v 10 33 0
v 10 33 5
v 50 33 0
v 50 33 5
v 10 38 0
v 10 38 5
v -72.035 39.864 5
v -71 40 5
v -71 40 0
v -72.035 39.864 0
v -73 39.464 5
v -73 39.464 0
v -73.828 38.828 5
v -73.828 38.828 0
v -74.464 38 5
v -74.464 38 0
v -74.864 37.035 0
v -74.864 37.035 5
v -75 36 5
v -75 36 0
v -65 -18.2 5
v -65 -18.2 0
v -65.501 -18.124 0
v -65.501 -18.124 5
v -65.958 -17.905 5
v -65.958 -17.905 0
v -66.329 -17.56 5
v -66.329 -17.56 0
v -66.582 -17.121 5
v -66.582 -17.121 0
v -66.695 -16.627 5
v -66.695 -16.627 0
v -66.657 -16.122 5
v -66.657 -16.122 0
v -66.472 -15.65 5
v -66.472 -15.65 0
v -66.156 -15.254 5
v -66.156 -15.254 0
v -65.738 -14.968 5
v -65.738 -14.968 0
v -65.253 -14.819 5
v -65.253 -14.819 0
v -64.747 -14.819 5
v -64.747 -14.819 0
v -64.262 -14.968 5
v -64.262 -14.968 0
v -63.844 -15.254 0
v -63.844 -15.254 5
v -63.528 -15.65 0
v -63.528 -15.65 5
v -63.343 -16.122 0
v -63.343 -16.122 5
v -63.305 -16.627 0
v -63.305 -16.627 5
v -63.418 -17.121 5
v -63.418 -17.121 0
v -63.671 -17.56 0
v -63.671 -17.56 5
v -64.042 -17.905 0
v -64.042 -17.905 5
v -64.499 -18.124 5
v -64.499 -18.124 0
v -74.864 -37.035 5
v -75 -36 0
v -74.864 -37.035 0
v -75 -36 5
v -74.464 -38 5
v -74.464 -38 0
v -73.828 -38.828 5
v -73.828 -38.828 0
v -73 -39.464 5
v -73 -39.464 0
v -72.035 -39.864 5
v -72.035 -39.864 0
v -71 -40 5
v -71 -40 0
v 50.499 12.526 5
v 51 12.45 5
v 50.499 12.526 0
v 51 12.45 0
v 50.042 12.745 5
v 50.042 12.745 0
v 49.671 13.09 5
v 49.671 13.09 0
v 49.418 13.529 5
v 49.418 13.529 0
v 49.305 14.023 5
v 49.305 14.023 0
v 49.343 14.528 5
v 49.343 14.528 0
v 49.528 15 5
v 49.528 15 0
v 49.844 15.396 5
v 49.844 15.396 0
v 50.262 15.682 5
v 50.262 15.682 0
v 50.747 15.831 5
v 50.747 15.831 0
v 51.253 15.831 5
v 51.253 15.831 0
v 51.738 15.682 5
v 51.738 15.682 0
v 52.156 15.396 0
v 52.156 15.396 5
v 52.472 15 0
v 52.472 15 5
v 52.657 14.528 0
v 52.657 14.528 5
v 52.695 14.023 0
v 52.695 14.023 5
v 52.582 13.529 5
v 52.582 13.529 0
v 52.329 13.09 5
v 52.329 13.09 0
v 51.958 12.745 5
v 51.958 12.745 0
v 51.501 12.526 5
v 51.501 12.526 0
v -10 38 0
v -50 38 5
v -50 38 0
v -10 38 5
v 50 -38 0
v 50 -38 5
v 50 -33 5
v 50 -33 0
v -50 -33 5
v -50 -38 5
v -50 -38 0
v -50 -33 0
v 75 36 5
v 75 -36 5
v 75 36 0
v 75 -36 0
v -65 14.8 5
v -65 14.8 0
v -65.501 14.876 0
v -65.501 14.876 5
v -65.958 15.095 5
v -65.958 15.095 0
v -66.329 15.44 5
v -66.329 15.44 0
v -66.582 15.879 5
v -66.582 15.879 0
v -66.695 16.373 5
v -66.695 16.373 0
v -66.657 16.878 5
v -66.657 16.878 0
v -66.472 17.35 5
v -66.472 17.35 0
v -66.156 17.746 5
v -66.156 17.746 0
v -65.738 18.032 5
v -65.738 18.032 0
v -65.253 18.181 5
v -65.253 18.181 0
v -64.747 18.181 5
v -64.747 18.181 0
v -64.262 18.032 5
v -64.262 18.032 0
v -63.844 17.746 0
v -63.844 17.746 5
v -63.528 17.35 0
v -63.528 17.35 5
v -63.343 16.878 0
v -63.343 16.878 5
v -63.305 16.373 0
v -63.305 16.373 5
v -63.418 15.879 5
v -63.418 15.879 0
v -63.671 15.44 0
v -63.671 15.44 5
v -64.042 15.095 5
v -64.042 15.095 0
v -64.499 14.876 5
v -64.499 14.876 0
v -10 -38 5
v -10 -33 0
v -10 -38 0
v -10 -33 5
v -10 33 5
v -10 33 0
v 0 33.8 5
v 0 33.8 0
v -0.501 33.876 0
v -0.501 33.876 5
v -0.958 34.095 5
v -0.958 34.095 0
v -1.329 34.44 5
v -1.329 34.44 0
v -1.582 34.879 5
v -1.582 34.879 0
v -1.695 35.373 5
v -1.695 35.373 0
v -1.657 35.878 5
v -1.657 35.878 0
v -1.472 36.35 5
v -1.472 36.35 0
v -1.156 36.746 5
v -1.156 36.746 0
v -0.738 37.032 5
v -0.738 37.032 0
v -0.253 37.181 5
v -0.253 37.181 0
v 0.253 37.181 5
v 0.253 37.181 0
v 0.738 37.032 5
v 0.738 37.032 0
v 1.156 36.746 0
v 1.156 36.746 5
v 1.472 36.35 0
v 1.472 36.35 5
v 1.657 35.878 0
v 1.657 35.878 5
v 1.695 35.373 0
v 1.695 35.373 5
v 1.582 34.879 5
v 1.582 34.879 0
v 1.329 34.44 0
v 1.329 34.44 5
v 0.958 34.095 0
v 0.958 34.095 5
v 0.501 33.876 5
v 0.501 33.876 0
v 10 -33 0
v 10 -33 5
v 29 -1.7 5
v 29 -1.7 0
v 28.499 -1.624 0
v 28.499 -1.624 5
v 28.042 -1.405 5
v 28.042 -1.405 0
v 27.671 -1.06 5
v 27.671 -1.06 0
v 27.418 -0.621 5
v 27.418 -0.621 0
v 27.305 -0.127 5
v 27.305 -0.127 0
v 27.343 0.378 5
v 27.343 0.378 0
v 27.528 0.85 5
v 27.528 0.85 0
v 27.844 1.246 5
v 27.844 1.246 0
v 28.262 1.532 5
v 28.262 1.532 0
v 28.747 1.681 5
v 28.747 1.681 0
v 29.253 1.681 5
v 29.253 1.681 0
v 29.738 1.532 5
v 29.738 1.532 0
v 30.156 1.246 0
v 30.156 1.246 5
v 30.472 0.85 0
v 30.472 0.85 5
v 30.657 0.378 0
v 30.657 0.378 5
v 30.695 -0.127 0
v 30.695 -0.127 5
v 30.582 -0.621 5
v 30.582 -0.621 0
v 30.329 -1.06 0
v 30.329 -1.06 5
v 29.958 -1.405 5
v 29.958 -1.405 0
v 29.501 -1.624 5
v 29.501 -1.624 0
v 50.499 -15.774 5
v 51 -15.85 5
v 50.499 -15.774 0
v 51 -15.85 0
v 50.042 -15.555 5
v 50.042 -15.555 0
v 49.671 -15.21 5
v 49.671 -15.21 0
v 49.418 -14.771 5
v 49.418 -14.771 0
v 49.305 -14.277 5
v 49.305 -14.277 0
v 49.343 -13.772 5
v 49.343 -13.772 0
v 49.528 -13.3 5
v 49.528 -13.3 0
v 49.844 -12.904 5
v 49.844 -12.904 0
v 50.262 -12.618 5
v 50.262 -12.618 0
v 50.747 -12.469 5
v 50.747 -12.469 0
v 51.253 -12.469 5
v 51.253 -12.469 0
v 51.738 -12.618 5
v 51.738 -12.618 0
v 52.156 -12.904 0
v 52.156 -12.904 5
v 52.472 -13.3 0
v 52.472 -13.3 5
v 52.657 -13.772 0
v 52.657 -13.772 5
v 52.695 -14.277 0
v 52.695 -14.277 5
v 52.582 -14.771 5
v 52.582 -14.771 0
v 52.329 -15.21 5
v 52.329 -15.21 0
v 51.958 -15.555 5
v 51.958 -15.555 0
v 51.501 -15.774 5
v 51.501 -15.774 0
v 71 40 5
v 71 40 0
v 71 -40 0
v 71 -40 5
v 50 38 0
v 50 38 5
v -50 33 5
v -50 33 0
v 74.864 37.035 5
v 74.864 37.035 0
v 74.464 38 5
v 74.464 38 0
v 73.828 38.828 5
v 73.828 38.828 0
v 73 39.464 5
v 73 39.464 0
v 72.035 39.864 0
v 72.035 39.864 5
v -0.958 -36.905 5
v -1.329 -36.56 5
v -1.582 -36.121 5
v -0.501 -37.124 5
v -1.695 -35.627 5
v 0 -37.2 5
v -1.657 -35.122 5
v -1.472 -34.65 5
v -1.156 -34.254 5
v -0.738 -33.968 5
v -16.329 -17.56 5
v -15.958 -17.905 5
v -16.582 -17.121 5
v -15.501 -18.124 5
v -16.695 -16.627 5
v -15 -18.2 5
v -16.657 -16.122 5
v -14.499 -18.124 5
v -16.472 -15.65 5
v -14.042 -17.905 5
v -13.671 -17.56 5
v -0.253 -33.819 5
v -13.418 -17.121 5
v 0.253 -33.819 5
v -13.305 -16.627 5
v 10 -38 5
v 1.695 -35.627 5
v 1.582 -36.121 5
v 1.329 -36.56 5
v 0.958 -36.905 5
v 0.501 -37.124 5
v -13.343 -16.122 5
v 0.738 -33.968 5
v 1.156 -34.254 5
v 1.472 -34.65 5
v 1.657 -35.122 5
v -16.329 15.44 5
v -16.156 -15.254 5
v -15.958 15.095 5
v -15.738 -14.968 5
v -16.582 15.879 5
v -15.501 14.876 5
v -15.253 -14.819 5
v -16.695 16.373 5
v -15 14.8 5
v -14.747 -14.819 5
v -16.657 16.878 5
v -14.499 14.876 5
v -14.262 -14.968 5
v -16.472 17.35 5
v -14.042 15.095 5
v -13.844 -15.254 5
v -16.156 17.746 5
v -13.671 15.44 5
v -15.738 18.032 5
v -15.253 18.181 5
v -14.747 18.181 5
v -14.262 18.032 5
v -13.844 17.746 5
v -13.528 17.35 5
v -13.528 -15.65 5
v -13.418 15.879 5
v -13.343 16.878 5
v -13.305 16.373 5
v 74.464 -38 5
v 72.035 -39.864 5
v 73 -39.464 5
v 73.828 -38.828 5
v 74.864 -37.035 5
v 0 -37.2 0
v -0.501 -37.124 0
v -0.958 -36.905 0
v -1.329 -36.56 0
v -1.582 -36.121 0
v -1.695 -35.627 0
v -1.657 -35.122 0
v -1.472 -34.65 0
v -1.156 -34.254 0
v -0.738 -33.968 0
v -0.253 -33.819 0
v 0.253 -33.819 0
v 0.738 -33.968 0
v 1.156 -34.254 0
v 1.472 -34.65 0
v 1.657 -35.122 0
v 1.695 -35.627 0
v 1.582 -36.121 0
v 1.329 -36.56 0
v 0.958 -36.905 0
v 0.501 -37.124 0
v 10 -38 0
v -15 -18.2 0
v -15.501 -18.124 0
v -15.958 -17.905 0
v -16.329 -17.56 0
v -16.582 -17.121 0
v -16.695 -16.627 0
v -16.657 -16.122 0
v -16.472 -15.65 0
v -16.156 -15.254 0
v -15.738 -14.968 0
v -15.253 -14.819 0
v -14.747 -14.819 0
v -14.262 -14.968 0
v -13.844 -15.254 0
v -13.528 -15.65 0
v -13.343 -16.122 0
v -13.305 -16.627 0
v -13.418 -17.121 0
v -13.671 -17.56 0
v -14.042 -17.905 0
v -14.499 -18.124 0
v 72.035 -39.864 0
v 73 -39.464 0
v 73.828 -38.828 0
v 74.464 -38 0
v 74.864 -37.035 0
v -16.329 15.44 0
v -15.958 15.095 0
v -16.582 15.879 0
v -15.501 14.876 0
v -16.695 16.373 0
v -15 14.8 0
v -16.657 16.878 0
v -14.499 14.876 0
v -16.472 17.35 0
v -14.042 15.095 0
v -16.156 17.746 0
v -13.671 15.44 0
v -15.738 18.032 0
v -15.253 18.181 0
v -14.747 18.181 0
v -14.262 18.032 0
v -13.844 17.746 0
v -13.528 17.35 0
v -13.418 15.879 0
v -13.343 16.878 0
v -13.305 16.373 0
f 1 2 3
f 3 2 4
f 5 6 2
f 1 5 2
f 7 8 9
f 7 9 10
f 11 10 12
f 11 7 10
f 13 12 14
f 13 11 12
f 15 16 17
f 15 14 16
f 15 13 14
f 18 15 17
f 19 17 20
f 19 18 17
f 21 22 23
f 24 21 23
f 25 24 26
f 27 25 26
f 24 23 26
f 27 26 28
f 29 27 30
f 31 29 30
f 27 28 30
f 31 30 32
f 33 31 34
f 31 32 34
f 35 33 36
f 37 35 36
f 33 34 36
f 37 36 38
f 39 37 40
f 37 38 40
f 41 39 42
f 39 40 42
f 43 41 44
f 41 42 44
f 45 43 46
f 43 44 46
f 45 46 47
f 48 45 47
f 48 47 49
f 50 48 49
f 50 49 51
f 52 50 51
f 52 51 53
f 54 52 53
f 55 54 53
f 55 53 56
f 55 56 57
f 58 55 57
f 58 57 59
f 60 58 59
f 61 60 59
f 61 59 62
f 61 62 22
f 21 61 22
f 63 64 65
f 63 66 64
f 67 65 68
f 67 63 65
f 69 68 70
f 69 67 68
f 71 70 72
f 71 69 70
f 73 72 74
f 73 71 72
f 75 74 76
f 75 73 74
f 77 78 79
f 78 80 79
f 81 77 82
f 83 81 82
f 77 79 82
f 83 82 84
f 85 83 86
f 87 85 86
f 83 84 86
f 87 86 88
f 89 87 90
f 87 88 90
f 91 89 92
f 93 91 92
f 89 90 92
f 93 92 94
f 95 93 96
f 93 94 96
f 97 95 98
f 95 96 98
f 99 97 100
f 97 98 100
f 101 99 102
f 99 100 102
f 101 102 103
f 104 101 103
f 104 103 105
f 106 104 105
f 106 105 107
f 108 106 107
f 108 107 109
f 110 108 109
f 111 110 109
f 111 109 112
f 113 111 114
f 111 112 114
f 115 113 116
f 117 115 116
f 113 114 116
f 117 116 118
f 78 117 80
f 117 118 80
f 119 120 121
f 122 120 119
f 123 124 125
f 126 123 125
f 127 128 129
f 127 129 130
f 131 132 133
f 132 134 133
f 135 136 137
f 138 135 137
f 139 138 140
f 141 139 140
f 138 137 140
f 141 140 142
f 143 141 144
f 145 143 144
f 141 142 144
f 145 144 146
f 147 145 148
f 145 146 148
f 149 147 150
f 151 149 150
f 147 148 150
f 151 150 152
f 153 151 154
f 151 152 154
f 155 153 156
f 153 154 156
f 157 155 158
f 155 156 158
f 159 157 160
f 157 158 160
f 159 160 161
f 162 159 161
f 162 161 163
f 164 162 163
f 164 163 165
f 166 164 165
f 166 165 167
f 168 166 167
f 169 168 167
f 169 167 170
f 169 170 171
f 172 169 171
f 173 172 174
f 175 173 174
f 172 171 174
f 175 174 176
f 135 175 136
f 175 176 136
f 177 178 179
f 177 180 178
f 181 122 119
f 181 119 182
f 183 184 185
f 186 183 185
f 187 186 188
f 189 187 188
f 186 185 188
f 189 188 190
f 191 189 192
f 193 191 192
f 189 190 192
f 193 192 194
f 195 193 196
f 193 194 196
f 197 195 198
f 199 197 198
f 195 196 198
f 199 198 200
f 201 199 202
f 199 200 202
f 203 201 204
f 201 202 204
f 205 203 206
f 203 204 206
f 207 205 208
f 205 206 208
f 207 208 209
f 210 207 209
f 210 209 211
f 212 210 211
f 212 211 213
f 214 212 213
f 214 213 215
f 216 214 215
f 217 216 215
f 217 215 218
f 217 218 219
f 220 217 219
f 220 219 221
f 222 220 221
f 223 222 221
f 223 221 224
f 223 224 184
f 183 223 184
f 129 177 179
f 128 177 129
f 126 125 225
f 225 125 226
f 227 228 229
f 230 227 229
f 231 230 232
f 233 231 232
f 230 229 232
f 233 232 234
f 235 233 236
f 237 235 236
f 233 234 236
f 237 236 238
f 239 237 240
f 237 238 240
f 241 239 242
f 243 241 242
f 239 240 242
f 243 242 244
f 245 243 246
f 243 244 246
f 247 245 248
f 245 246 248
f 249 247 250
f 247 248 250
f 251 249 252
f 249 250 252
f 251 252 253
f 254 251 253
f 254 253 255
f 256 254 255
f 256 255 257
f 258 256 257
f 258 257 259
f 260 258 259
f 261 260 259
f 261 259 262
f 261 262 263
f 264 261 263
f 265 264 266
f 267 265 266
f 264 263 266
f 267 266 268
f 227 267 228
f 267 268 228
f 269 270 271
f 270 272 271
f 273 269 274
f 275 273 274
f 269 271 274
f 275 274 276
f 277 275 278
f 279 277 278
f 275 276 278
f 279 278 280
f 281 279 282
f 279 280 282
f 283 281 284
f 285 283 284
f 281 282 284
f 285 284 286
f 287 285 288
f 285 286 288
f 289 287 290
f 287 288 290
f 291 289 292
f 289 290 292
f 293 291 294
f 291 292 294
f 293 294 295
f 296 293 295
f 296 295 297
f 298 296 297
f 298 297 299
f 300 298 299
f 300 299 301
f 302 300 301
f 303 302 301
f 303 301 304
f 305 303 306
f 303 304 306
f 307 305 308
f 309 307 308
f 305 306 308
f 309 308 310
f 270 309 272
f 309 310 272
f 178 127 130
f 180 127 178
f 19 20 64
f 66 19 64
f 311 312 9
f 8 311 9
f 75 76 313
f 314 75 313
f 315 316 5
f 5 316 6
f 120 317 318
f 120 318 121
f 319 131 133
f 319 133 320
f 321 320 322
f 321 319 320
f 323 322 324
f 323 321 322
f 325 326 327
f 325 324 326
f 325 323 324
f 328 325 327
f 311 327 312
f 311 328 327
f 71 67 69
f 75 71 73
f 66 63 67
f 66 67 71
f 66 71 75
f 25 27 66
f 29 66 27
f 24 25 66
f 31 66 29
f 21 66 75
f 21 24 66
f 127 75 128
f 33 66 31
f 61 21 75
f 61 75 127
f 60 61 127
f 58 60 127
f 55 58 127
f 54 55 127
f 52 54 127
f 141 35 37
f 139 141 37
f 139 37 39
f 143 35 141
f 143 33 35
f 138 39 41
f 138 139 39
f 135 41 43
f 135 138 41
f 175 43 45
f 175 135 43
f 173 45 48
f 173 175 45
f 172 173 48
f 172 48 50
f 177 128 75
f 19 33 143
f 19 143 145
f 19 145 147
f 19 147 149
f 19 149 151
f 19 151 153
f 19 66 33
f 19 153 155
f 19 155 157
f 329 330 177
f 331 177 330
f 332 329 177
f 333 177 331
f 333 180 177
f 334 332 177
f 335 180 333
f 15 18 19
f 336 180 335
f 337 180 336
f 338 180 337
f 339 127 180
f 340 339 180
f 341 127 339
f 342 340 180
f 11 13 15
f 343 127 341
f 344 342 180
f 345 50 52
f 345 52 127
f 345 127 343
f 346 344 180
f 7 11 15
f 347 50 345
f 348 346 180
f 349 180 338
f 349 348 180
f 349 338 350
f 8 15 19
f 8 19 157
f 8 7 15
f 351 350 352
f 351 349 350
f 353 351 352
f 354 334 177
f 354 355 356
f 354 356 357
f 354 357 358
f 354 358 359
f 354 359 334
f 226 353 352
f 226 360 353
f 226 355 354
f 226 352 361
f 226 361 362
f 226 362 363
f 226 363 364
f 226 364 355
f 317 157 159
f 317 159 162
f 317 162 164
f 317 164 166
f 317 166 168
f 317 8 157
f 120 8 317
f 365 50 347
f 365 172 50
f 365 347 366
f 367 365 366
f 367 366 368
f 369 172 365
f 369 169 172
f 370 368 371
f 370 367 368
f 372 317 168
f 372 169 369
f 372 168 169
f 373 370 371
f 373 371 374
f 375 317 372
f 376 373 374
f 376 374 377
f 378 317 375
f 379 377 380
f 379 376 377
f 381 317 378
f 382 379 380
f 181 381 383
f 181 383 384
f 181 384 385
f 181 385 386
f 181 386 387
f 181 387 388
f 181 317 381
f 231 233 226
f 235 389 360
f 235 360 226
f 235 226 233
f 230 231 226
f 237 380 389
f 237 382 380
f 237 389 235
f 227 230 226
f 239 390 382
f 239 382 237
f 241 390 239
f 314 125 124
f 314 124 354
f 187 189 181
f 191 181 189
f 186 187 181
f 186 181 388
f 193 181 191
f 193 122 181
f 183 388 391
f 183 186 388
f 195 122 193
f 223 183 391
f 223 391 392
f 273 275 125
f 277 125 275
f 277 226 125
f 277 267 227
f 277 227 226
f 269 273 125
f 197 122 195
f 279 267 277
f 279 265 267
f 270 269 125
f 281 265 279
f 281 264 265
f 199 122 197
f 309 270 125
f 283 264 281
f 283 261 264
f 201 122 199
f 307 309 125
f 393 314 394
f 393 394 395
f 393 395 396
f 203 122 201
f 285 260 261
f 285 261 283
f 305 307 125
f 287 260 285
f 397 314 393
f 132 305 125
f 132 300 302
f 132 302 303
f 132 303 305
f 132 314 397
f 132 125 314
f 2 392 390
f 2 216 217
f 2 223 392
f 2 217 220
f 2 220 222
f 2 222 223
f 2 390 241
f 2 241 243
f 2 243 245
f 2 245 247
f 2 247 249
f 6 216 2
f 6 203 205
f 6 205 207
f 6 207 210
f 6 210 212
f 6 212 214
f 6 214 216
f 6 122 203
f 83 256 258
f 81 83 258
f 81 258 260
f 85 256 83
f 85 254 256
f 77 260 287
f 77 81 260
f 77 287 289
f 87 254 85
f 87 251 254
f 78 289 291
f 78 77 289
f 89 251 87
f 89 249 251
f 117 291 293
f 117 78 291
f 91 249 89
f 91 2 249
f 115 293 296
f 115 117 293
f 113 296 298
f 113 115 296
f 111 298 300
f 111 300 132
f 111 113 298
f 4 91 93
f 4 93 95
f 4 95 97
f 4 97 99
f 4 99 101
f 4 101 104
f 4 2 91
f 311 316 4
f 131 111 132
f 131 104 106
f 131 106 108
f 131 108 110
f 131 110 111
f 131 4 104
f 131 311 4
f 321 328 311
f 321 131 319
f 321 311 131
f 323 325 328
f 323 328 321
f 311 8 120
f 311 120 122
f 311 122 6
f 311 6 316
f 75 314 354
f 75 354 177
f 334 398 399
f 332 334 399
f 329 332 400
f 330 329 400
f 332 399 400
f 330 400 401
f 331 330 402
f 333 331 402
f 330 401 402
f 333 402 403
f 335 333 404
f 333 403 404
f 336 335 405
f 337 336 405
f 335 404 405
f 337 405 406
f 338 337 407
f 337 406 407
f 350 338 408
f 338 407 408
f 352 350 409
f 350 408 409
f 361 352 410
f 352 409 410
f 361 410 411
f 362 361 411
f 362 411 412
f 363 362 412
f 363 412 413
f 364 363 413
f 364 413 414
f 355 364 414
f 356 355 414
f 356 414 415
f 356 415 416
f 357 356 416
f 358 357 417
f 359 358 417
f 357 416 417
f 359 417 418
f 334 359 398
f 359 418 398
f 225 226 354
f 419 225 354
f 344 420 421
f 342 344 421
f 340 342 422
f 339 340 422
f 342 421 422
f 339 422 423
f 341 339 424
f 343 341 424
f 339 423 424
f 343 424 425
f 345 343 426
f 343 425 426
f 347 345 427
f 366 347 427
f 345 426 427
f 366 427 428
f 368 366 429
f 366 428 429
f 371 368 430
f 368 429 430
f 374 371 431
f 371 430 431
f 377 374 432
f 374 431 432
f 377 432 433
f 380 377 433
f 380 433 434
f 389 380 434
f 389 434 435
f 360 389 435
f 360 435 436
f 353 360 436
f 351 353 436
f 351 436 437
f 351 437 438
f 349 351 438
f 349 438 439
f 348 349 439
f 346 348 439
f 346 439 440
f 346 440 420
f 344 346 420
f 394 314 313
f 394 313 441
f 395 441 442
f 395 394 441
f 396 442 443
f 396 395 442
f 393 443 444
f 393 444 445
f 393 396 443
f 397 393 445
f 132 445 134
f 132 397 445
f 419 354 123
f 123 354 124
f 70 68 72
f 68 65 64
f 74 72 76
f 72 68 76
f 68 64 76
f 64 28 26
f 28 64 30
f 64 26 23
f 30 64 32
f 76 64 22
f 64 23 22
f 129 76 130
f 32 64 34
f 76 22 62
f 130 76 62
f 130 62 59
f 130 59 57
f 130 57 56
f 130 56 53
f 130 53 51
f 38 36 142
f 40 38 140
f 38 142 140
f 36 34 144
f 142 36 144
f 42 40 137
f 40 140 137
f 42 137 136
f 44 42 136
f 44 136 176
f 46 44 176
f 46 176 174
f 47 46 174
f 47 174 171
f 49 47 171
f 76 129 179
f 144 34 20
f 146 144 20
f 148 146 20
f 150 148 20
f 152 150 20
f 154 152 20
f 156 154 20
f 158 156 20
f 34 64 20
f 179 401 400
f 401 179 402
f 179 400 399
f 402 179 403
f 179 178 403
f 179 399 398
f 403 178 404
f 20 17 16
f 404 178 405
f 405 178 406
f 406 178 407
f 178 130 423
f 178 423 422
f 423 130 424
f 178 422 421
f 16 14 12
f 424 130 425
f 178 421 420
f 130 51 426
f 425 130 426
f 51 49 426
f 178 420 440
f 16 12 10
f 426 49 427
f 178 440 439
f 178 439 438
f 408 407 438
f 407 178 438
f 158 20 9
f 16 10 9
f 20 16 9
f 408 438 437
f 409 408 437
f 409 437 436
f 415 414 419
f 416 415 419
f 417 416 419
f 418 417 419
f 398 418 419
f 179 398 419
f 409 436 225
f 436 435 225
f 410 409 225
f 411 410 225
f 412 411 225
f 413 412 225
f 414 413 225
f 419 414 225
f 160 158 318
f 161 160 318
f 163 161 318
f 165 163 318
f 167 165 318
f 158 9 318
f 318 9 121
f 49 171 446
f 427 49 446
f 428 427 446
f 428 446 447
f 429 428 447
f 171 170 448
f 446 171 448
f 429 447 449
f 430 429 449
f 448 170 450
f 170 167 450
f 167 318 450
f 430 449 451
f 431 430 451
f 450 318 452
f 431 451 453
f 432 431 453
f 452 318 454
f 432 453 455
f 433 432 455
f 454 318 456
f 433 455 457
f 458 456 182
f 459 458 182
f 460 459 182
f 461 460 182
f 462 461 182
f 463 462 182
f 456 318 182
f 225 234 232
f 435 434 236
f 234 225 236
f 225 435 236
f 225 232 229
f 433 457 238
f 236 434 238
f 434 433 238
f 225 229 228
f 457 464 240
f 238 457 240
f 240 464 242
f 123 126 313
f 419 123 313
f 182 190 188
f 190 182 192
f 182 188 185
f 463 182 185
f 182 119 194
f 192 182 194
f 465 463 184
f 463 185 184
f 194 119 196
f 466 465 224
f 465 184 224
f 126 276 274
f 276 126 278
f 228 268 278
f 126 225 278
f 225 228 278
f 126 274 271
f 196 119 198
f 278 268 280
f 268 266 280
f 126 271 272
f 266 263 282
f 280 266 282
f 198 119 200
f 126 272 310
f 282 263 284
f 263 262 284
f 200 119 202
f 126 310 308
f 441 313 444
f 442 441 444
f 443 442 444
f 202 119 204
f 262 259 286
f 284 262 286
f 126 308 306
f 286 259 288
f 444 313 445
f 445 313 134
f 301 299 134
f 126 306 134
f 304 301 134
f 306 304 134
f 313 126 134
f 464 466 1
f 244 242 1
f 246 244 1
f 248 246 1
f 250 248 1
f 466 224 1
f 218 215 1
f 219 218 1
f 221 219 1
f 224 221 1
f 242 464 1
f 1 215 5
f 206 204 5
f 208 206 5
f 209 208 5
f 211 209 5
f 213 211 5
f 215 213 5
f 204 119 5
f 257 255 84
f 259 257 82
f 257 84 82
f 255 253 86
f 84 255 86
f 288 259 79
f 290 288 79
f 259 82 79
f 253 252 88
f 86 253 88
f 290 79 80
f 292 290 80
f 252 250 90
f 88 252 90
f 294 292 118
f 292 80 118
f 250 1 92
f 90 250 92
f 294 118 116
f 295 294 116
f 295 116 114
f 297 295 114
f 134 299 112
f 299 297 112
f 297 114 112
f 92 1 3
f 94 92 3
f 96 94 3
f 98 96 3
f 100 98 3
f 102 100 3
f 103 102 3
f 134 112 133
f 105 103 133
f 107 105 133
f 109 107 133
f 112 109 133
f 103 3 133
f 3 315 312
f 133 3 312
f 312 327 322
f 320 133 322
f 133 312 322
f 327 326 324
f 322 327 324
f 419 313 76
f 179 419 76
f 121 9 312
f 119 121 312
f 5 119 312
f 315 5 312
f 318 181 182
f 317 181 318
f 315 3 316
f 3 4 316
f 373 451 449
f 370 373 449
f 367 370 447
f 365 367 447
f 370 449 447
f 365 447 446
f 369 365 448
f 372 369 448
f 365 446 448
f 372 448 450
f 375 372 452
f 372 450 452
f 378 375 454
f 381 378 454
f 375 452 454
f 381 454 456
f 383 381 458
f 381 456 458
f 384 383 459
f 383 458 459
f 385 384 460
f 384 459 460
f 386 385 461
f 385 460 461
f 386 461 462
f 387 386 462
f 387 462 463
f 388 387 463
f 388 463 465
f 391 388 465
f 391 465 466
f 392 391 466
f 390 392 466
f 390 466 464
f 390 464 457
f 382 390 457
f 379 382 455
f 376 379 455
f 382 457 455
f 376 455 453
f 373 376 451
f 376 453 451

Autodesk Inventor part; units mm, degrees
ref_plane "YZ Plane" through (0, 0, 0) normal (1, 0, 0) x (0, 1, 0)
ref_plane "XZ Plane" through (0, 0, 0) normal (0, 1, 0) x (-1, 0, 0)
ref_plane "XY Plane" through (0, 0, 0) normal (0, 0, 1) x (1, 0, 0)
sketch "Sketch1" plane through (0, 0, 0) normal (0, 0, 1) x (1, 0, 0)
  line L0 (-75, -40) -> (75, -40)
  line L1 (75, -40) -> (75, 40)
  line L2 (75, 40) -> (-75, 40)
  line L3 (-75, 40) -> (-75, -40)
  line L4 (-75, -40) -> (75, 40) construction
  line L5 (75, -40) -> (-75, 40) construction
  point P0 (0, 0)
  dimension "d0" = 80
  dimension "d1" = 150
extrude "Extrusion1" add sketch "Sketch1" along normal blind 5
sketch "Sketch2" plane through (0, 0, 5) normal (0, 0, 1) x (1, 0, 0)
  line L0 (29, -14.15) -> (51, -14.15) construction
  line L1 (51, -14.15) -> (51, 14.15) construction
  line L2 (51, 14.15) -> (29, 14.15) construction
  line L3 (29, 14.15) -> (29, -14.15) construction
  line L4 (29, -14.15) -> (51, 14.15) construction
  line L5 (51, -14.15) -> (29, 14.15) construction
  line L6 (-65, -16.5) -> (-15, -16.5) construction
  line L7 (-15, -16.5) -> (-15, 16.5) construction
  line L8 (-15, 16.5) -> (-65, 16.5) construction
  line L9 (-65, 16.5) -> (-65, -16.5) construction
  line L10 (-65, -16.5) -> (-15, 16.5) construction
  line L11 (-15, -16.5) -> (-65, 16.5) construction
  point P0 (0, 0)
  point P1 (40, 0)
  point P2 (-40, 0)
  point P3 (-40, 0)
  point P4 (40, 0)
  point P5 (29, 0)
  dimension "d4" = 50
  dimension "d5" = 33
  dimension "d6" = 40
  dimension "d7" = 28.3
  dimension "d8" = 22
  dimension "d9" = 40
hole "Hole1" at (51, 14.15, 5) at (51, -14.15, 5) at (29, 0, 5) at (-15, -16.5, 5) at (-15, 16.5, 5) at (-65, 16.5, 5) at (-65, -16.5, 5) direction (0, 0, -1) diameter 3.4 depth 8 tip angle 118 clearance for "Countersunk Flat Head Screw DIN EN ISO 2009" size "M3" standard "DIN"
sketch "Sketch3" plane through (0, 0, 5) normal (0, 0, 1) x (1, 0, 0)
  line L0 (-50, 38) -> (50, 38) construction
  line L1 (50, 38) -> (50, 33) construction
  line L2 (50, 33) -> (-50, 33) construction
  line L3 (-50, 33) -> (-50, 38) construction
  line L4 (-50, 38) -> (50, 33) construction
  line L5 (50, 38) -> (-50, 33) construction
  line L6 (-50, -33) -> (50, -33) construction
  line L7 (50, -33) -> (50, -38) construction
  line L8 (50, -38) -> (-50, -38) construction
  line L9 (-50, -38) -> (-50, -33) construction
  line L10 (-50, -33) -> (50, -38) construction
  line L11 (50, -33) -> (-50, -38) construction
  line L12 (75, 40) -> (-75, 40) projected
  line L13 (-75, -40) -> (75, -40) projected
  line L14 (-50, 38) -> (-10, 38)
  line L15 (-10, 38) -> (-10, 33)
  line L16 (-10, 33) -> (-50, 33)
  line L17 (-50, 33) -> (-50, 38)
  line L18 (50, 38) -> (10, 38)
  line L19 (10, 38) -> (10, 33)
  line L20 (10, 33) -> (50, 33)
  line L21 (50, 33) -> (50, 38)
  line L22 (50, -33) -> (10, -33)
  line L23 (10, -33) -> (10, -38)
  line L24 (10, -38) -> (50, -38)
  line L25 (50, -38) -> (50, -33)
  line L26 (-50, -33) -> (-10, -33)
  line L27 (-10, -33) -> (-10, -38)
  line L28 (-10, -38) -> (-50, -38)
  line L29 (-50, -38) -> (-50, -33)
  point P0 (0, 0)
  point P1 (0, 35.5)
  point P2 (0, -35.5)
  point P3 (0, 35.5)
  point P4 (0, -35.5)
  dimension "d17" = 5
  dimension "d18" = 5
  dimension "d19" = 2
  dimension "d20" = 2
  dimension "d21" = 100
  dimension "d22" = 20
  dimension "d23" = 10
extrude "Extrusion2" cut sketch "Sketch3" against normal blind 5
fillet "Fillet1" radius 4 4 edges at (75, 40, 2.5) (75, -40, 2.5) (-75, -40, 2.5) (-75, 40, 2.5)
sketch "Sketch4" plane through (0, 0, 5) normal (0, 0, 1) x (1, 0, 0)
  line L0 (-10, -38) -> (-50, -38) projected
  line L1 (-50, 38) -> (-10, 38) projected
  point P0 (0, 0)
  point P1 (0, 35.5)
  point P2 (0, -35.5)
  dimension "d27" = 2.5
  dimension "d28" = 2.5
hole "Hole2" at (0, 35.5, 5) at (0, -35.5, 5) direction (0, 0, -1) diameter 3.4 depth 8 tip angle 118 clearance for "Countersunk Flat Head Screw DIN EN ISO 2009" size "M3" standard "DIN"
equation "\"d23\" = 0.5 * d22"
properties part number "Interrupter_Bottom" material "Polycarbonate, Clear"
